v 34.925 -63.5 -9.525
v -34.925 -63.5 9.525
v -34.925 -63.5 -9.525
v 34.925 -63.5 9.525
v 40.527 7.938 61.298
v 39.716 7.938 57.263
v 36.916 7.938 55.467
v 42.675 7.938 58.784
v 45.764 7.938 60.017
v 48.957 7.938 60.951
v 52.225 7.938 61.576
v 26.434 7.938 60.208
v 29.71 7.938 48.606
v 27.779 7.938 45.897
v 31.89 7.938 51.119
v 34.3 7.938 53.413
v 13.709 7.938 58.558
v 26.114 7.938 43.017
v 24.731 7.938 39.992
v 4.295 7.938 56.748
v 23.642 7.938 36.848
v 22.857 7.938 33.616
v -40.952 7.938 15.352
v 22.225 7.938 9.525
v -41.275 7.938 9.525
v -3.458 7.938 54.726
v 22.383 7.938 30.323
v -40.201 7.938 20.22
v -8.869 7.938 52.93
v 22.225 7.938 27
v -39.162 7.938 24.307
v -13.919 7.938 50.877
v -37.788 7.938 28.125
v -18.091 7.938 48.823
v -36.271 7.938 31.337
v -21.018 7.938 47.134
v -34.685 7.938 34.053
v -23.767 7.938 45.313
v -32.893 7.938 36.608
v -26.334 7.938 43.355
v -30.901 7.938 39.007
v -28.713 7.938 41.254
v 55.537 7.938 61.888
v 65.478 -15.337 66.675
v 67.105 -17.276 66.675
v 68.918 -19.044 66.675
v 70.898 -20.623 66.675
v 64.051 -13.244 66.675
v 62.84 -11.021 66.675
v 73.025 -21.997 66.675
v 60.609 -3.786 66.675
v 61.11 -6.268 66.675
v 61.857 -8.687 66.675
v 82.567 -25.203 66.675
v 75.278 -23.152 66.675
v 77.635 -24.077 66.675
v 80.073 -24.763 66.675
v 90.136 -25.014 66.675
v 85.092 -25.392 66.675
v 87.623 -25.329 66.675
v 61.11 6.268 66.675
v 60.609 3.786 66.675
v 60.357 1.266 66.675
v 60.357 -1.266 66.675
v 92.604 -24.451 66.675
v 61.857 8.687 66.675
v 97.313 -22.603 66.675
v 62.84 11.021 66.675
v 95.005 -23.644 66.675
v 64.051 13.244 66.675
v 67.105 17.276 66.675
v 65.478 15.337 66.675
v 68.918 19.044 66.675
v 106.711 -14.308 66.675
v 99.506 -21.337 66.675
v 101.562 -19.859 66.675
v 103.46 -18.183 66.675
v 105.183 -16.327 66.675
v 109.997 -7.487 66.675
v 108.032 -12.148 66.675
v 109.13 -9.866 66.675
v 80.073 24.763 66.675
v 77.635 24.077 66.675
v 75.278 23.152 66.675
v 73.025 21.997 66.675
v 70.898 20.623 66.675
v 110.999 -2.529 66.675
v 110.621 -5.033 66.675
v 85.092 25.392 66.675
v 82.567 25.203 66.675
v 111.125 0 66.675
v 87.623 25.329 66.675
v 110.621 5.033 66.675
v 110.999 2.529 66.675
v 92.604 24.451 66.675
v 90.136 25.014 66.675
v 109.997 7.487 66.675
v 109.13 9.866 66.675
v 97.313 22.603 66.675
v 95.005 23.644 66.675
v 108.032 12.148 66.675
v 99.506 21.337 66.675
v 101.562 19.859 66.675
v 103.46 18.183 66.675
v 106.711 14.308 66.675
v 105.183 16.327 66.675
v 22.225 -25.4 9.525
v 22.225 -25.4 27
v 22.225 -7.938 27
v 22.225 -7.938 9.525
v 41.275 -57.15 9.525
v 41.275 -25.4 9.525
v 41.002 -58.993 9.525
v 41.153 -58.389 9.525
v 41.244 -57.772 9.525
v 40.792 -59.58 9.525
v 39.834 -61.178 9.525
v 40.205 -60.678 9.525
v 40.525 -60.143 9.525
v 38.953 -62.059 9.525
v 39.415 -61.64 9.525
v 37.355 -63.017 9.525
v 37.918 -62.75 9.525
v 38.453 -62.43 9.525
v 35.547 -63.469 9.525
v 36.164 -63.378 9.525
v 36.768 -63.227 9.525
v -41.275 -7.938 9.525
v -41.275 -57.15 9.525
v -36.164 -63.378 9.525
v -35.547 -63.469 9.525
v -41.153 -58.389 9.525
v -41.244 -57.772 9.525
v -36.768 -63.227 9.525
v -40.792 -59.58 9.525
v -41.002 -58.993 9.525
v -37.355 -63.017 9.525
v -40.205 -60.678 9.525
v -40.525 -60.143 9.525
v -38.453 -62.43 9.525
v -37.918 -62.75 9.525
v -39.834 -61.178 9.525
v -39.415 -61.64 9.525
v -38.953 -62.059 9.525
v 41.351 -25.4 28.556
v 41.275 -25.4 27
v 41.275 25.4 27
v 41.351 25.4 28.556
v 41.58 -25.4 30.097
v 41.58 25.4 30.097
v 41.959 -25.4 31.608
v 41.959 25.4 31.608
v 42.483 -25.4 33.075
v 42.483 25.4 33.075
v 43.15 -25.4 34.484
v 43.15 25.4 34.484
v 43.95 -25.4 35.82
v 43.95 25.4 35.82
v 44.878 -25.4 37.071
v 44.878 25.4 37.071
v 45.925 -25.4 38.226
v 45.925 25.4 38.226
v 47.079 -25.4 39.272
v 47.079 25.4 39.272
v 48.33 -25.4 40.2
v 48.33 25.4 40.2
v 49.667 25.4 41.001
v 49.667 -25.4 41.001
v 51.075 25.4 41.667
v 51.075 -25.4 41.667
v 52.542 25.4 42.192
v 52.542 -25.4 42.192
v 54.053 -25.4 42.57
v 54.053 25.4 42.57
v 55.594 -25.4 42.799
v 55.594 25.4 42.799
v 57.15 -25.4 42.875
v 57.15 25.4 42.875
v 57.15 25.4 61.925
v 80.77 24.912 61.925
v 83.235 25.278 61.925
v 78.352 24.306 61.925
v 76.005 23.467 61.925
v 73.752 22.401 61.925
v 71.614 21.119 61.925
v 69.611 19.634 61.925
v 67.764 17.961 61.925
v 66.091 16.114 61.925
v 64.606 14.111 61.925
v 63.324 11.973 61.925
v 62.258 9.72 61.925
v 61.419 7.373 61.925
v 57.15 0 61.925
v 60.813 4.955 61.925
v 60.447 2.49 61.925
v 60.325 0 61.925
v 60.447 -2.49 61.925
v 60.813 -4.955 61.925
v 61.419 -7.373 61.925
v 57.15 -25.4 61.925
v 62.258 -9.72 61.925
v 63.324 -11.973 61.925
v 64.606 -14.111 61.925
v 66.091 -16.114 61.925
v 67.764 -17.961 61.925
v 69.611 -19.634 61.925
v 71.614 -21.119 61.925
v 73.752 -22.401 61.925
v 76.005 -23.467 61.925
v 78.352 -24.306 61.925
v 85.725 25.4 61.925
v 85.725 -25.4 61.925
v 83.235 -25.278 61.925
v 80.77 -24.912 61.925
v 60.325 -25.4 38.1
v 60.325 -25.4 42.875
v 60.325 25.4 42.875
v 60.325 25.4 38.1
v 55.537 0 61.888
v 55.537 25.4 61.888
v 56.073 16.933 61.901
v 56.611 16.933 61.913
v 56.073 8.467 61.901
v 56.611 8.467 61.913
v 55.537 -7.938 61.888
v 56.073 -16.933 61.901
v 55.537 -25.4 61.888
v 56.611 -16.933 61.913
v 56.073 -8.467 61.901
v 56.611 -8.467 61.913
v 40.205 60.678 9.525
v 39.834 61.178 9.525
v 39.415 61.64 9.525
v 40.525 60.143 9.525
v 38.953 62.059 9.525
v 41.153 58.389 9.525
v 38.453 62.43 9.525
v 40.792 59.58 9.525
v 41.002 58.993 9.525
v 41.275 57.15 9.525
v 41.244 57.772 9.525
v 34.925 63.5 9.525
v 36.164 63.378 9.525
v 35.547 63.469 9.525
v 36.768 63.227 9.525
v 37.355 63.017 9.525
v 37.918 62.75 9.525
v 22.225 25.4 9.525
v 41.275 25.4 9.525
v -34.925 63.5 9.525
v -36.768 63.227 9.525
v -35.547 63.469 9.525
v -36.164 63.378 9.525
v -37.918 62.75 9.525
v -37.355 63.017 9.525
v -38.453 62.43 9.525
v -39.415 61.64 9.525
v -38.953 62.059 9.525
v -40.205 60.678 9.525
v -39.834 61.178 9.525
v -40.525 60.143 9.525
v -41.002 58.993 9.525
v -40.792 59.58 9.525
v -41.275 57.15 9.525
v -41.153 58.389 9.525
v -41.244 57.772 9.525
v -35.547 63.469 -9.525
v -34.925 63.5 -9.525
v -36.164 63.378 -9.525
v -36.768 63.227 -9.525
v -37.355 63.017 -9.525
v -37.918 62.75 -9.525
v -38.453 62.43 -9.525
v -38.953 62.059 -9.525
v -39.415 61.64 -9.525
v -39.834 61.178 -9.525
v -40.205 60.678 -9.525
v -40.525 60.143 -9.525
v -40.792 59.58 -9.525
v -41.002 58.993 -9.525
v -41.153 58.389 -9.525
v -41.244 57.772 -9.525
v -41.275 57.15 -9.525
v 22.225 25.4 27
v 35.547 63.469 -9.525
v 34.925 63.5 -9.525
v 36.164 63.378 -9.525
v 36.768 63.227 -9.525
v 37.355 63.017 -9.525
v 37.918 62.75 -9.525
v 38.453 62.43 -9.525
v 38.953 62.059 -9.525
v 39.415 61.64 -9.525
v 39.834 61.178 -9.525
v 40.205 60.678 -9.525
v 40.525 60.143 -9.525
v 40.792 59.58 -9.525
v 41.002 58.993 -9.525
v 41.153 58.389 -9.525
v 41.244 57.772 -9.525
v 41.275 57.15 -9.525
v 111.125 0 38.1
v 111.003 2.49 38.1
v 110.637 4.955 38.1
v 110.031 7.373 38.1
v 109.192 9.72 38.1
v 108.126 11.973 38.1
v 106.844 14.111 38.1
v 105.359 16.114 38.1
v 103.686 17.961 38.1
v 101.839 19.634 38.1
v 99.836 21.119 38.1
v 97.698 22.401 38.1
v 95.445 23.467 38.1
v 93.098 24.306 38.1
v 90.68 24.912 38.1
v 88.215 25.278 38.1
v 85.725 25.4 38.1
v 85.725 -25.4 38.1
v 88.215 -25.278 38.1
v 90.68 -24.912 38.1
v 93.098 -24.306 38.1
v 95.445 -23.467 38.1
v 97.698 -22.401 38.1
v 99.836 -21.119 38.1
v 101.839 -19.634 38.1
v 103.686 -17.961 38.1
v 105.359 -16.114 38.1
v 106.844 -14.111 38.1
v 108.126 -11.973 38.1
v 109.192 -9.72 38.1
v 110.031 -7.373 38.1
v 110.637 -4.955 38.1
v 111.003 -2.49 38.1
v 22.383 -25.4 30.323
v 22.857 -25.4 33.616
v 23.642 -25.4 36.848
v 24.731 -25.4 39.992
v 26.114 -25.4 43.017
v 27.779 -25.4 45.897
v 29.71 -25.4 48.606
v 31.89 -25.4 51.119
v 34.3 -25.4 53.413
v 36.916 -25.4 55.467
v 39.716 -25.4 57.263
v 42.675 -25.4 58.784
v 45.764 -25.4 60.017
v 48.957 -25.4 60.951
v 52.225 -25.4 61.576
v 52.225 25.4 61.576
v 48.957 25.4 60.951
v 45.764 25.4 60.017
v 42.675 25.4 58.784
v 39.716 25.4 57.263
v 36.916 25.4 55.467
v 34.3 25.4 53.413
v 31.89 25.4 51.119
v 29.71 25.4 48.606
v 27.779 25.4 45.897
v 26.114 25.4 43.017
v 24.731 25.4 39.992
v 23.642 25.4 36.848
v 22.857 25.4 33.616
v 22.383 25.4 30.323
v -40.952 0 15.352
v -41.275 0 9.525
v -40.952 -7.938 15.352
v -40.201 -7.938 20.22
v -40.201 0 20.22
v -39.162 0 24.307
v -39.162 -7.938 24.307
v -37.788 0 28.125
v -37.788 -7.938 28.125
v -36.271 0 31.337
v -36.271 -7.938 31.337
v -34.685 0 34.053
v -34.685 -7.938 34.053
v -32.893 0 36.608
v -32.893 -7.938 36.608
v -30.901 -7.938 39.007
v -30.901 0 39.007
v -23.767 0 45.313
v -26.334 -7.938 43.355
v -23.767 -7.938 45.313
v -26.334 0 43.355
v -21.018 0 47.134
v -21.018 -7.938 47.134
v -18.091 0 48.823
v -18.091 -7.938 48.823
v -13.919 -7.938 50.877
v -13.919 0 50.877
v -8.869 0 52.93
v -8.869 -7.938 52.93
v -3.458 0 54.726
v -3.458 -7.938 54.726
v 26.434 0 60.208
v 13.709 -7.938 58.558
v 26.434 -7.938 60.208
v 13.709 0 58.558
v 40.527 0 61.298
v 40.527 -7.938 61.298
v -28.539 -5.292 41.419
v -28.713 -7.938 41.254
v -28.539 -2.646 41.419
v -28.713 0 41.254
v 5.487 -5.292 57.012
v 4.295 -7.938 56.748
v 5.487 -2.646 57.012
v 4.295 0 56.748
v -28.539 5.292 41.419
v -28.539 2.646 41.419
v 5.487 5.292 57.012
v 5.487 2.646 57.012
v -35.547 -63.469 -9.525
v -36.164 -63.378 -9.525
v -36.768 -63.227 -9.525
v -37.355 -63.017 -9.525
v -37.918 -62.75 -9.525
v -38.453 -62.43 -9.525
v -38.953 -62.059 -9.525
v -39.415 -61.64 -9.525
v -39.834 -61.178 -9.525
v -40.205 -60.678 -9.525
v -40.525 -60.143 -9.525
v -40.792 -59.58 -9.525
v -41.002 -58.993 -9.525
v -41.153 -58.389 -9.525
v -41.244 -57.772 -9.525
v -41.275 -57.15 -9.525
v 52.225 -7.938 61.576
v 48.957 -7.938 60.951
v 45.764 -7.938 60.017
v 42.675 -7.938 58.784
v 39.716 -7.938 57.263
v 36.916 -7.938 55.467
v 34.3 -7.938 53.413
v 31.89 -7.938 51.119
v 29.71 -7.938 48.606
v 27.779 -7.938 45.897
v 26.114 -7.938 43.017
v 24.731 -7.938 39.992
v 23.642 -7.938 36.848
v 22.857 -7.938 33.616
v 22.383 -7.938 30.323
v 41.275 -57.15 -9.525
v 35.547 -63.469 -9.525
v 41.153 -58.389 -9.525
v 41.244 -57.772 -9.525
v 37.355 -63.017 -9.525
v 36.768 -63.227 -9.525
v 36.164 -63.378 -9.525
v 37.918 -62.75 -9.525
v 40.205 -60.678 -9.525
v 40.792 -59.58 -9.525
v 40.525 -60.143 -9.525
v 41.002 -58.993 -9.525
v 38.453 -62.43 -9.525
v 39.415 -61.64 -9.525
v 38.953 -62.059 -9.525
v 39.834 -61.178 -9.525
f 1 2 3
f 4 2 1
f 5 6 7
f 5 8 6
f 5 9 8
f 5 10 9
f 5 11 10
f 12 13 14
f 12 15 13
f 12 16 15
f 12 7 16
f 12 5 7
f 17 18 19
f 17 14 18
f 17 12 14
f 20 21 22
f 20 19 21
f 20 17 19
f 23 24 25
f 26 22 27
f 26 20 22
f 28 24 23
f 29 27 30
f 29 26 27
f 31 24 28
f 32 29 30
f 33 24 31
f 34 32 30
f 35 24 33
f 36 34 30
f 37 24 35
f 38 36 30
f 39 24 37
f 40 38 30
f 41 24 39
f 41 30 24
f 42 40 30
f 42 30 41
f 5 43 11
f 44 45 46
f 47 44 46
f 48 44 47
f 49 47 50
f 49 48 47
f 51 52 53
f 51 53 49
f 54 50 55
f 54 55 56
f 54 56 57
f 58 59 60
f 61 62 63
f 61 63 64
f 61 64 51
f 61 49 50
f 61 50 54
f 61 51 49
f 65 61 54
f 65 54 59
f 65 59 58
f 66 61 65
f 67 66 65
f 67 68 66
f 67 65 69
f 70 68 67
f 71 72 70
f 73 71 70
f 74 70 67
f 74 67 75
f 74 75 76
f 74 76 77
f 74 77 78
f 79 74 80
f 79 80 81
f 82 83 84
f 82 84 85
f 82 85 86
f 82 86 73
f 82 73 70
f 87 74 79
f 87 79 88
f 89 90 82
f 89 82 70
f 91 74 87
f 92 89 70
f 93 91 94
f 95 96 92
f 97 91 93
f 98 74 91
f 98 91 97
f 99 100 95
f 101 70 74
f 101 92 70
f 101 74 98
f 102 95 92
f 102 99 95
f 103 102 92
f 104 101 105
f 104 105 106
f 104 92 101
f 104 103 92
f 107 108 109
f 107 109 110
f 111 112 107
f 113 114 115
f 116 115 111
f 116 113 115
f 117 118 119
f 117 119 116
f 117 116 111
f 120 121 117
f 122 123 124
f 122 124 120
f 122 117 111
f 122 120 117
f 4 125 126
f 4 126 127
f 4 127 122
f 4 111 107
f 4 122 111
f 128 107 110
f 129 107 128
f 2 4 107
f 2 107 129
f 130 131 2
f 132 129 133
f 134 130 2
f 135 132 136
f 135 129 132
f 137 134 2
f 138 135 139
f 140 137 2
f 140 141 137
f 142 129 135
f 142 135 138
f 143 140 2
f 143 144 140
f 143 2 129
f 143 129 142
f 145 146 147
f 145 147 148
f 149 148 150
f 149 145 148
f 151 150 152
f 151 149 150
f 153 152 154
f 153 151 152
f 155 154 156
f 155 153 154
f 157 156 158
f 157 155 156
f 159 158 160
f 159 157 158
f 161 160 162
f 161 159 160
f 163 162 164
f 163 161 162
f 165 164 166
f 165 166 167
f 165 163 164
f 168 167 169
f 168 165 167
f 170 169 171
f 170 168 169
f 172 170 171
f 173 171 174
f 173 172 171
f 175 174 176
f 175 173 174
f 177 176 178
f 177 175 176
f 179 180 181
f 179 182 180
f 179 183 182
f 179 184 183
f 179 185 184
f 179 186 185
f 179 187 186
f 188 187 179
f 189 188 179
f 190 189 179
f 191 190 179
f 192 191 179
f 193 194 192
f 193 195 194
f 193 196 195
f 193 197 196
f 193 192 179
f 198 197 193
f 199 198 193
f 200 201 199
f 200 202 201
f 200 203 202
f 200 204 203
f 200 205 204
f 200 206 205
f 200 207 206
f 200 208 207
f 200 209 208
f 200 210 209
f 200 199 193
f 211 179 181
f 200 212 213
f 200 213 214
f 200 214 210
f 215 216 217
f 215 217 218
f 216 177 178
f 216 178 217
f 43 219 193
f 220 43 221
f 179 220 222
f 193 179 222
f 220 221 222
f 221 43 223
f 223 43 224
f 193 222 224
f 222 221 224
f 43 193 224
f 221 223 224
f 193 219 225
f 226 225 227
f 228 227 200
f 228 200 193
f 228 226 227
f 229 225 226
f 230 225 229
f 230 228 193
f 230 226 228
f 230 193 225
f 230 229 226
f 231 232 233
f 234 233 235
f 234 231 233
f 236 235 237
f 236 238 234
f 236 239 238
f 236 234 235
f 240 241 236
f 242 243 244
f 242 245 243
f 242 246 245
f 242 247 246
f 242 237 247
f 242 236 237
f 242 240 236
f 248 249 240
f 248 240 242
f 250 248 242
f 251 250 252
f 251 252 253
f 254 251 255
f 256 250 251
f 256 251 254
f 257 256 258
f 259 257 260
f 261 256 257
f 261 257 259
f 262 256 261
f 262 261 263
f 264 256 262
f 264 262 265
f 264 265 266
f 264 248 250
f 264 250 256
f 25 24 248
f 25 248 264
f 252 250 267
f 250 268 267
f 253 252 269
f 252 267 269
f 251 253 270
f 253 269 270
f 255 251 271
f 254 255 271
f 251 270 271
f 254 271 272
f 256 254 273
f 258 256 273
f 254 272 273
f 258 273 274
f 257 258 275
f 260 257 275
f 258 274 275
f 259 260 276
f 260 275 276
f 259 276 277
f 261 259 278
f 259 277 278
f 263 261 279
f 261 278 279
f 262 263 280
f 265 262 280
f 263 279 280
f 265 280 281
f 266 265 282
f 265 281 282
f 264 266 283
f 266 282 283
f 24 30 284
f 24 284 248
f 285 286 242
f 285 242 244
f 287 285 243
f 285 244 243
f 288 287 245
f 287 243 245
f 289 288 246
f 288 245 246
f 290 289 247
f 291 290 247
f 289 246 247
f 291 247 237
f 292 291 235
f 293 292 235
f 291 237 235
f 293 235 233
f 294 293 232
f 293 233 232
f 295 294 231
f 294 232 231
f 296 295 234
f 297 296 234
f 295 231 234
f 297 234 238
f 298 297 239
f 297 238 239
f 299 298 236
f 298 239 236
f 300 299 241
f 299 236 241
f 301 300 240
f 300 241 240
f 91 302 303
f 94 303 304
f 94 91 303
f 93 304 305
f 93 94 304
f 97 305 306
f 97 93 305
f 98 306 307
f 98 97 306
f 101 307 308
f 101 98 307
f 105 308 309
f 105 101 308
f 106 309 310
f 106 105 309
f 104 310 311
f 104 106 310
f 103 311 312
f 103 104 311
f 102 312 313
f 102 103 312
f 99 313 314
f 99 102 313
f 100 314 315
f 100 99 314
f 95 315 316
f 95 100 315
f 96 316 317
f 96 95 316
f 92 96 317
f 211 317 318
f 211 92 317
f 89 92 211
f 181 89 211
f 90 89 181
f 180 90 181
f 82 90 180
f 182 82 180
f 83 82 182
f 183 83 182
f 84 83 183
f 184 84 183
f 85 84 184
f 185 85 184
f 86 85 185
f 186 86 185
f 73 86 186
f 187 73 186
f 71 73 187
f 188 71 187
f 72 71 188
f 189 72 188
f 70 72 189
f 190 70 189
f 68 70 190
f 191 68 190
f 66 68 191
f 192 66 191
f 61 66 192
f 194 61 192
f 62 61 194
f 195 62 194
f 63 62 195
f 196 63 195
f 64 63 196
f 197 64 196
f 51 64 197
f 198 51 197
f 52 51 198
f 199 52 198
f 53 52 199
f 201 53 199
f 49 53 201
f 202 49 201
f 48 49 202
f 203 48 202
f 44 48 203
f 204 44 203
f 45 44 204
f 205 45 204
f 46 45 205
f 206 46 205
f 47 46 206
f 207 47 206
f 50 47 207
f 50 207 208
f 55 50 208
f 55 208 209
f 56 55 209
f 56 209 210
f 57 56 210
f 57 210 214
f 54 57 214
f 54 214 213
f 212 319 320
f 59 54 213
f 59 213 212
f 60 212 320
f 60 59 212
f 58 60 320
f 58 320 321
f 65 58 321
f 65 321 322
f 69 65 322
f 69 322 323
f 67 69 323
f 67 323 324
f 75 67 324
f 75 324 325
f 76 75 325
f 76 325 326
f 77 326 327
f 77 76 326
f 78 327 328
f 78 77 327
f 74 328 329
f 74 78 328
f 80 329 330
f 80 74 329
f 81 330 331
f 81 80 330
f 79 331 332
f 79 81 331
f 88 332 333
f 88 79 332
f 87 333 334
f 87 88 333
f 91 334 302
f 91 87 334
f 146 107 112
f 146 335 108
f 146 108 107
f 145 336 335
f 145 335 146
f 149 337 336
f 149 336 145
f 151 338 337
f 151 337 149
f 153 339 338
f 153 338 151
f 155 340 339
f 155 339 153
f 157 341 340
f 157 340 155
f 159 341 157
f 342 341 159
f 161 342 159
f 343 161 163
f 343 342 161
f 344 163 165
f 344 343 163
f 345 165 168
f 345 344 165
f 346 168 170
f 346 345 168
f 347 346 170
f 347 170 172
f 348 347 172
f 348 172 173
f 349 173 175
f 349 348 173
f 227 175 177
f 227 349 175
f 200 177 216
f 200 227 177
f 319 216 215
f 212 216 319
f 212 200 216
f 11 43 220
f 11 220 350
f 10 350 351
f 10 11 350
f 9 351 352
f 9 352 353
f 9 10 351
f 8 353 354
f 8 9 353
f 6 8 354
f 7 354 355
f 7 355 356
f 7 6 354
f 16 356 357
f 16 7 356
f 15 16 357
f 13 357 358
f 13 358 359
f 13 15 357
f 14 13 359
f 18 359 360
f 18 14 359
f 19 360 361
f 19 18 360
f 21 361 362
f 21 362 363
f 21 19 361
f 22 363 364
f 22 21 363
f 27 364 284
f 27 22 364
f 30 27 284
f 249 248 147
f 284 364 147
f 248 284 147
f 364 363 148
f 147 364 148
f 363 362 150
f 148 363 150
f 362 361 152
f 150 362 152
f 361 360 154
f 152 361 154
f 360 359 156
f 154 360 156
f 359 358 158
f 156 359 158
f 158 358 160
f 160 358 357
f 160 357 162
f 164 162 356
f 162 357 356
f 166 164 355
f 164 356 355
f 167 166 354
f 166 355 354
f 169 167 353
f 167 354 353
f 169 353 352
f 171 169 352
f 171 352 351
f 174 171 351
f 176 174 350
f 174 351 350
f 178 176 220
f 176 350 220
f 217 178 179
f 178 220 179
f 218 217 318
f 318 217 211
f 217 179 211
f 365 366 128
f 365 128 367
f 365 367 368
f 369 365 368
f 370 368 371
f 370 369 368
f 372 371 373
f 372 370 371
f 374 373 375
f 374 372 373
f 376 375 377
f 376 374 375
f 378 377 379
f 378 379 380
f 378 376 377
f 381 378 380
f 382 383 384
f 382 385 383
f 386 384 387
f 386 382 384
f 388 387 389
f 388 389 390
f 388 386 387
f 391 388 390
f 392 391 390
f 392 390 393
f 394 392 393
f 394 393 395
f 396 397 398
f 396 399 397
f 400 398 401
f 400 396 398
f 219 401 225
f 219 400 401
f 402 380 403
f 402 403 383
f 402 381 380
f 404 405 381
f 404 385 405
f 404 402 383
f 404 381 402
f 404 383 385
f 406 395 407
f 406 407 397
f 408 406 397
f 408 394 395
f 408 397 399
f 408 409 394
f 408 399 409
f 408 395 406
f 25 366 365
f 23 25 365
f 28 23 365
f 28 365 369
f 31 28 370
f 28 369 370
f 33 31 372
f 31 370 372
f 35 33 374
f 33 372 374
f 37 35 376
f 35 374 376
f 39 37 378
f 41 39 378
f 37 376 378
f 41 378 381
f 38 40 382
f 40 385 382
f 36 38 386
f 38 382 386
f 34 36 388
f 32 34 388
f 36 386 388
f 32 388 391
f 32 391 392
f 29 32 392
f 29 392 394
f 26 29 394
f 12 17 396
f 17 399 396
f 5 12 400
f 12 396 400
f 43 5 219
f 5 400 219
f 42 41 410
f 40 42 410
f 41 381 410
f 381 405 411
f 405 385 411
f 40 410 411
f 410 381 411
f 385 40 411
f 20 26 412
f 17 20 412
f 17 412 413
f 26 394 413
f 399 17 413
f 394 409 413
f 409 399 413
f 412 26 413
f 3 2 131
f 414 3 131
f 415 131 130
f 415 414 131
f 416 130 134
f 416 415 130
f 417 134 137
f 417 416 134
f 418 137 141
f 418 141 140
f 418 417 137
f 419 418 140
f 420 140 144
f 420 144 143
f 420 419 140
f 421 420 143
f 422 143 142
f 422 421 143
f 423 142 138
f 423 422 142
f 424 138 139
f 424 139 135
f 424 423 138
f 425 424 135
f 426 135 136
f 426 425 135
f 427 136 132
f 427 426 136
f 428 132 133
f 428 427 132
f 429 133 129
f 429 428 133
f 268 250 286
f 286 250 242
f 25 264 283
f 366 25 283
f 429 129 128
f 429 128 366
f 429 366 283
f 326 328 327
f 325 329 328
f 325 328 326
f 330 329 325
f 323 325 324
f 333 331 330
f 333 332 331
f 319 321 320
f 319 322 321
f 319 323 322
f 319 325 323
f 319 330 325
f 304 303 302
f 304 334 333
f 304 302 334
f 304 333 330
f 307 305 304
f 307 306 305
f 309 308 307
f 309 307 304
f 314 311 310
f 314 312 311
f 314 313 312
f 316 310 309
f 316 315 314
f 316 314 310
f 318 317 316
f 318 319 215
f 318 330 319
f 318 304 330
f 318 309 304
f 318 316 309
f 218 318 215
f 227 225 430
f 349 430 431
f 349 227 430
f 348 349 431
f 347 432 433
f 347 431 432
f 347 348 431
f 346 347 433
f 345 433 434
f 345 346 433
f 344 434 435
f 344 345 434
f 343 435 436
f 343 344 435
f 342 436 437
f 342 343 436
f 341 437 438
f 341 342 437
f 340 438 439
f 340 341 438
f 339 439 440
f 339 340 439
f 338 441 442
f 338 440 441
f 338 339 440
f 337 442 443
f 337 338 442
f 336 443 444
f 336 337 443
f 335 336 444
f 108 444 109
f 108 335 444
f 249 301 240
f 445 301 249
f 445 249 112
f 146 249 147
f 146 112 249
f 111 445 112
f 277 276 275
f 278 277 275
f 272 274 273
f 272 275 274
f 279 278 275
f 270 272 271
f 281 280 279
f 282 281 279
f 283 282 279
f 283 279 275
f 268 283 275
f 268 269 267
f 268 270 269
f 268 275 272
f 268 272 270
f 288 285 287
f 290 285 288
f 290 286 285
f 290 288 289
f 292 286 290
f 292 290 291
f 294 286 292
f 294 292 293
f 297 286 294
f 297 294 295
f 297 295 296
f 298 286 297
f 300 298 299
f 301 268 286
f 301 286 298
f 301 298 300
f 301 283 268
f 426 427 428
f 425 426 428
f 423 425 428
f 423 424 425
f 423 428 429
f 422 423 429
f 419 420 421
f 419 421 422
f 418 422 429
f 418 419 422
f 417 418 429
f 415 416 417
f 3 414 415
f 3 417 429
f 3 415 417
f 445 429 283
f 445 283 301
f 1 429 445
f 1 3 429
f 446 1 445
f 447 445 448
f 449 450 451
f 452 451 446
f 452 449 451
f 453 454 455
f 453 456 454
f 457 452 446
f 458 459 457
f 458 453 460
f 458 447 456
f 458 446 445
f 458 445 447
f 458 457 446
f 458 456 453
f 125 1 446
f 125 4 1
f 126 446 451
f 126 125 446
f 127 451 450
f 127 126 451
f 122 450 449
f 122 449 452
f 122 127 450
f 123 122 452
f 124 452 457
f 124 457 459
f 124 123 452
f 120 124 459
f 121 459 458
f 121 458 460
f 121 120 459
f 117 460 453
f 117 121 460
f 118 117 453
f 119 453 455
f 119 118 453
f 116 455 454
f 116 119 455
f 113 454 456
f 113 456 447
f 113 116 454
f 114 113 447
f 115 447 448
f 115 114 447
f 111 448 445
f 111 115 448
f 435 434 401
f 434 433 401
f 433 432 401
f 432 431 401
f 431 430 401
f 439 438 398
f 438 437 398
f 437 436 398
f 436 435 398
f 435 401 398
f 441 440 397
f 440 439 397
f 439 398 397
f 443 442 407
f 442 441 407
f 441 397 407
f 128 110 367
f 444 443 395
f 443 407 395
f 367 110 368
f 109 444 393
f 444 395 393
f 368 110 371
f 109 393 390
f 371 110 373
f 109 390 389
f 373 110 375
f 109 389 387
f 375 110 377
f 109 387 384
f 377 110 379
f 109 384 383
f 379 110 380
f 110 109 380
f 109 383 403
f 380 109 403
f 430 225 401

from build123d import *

# Parameters (mm, degrees)
F1_DEPTH = 63.5
F2_DEPTH = 25.4
F3_DEPTH = 7.9375
F5_R     = 6.35


with BuildPart() as f1:
    # F0 (on Front) → F1 (new body, symmetric)
    with BuildSketch(Plane.XZ):
        Polygon((-41.275, 9.525), (-41.275, -9.525), (41.275, -9.525), (41.275, 9.525), (22.225, 9.525), align=None)
    extrude(amount=F1_DEPTH, both=True)

    # F0 (on Front) → F2 (join, symmetric)
    with BuildSketch(Plane.XZ):
        with BuildLine():
            Line((22.225, 9.525), (41.275, 9.525))
            Line((41.275, 9.525), (41.275, 27.0002))
            ThreePointArc((41.275, 27.0002), (45.92468, 38.22552), (57.15, 42.8752))
            Line((57.15, 42.8752), (60.325, 42.8752))
            Line((60.325, 42.8752), (60.325, 61.9252))
            Line((60.325, 61.9252), (57.15, 61.9252))
            add(Edge.make_bspline(
                [(55.536606, 61.887914), (56.072947, 61.901034), (56.610752, 61.913456), (57.15, 61.9252)],
                knots=[110.452417, 110.452417, 110.452417, 110.452417, 111.504536, 111.504536, 111.504536, 111.504536], degree=3))
            ThreePointArc((55.536606, 61.887914), (31.890315, 51.118739), (22.225, 27.0002))
            Line((22.225, 27.0002), (22.225, 9.525))
        make_face()
        Polygon((85.725, 61.9252), (60.325, 61.9252), (60.325, 42.8752), (60.325, 38.1), (85.725, 38.1), align=None)
    extrude(amount=F2_DEPTH, both=True)

    # F0 (on Front) → F3 (join, symmetric)
    with BuildSketch(Plane.XZ):
        with BuildLine():
            add(Edge.make_bspline(
                [(-41.275, 9.525), (-40.940461, 51.429681), (-0.768926, 60.510521), (55.536606, 61.887914)],
                knots=[0, 0, 0, 0, 110.452417, 110.452417, 110.452417, 110.452417], degree=3))
            Line((-41.275, 9.525), (22.225, 9.525))
            Line((22.225, 9.525), (22.225, 27.0002))
            ThreePointArc((22.225, 27.0002), (31.890315, 51.118739), (55.536606, 61.887914))
        make_face()
    extrude(amount=F3_DEPTH, both=True)

    # F0 (on Front) → F4 (revolve)
    with BuildSketch(Plane.XZ):
        Polygon((85.725, 66.675), (85.725, 61.9252), (85.725, 38.1), (111.125, 38.1), (111.125, 66.675), align=None)
    revolve(axis=Axis((85.725, 0, 52.3875), (0, 0, 1)))

    # F5
    f5_edges = [f1.edges().sort_by_distance(p)[0] for p in [
        (41.275, -63.5, 0),
        (-41.275, -63.5, 0),
        (41.275, 63.5, 0),
        (-41.275, 63.5, 0),
    ]]
    fillet(f5_edges, radius=F5_R)


solid = f1.part
